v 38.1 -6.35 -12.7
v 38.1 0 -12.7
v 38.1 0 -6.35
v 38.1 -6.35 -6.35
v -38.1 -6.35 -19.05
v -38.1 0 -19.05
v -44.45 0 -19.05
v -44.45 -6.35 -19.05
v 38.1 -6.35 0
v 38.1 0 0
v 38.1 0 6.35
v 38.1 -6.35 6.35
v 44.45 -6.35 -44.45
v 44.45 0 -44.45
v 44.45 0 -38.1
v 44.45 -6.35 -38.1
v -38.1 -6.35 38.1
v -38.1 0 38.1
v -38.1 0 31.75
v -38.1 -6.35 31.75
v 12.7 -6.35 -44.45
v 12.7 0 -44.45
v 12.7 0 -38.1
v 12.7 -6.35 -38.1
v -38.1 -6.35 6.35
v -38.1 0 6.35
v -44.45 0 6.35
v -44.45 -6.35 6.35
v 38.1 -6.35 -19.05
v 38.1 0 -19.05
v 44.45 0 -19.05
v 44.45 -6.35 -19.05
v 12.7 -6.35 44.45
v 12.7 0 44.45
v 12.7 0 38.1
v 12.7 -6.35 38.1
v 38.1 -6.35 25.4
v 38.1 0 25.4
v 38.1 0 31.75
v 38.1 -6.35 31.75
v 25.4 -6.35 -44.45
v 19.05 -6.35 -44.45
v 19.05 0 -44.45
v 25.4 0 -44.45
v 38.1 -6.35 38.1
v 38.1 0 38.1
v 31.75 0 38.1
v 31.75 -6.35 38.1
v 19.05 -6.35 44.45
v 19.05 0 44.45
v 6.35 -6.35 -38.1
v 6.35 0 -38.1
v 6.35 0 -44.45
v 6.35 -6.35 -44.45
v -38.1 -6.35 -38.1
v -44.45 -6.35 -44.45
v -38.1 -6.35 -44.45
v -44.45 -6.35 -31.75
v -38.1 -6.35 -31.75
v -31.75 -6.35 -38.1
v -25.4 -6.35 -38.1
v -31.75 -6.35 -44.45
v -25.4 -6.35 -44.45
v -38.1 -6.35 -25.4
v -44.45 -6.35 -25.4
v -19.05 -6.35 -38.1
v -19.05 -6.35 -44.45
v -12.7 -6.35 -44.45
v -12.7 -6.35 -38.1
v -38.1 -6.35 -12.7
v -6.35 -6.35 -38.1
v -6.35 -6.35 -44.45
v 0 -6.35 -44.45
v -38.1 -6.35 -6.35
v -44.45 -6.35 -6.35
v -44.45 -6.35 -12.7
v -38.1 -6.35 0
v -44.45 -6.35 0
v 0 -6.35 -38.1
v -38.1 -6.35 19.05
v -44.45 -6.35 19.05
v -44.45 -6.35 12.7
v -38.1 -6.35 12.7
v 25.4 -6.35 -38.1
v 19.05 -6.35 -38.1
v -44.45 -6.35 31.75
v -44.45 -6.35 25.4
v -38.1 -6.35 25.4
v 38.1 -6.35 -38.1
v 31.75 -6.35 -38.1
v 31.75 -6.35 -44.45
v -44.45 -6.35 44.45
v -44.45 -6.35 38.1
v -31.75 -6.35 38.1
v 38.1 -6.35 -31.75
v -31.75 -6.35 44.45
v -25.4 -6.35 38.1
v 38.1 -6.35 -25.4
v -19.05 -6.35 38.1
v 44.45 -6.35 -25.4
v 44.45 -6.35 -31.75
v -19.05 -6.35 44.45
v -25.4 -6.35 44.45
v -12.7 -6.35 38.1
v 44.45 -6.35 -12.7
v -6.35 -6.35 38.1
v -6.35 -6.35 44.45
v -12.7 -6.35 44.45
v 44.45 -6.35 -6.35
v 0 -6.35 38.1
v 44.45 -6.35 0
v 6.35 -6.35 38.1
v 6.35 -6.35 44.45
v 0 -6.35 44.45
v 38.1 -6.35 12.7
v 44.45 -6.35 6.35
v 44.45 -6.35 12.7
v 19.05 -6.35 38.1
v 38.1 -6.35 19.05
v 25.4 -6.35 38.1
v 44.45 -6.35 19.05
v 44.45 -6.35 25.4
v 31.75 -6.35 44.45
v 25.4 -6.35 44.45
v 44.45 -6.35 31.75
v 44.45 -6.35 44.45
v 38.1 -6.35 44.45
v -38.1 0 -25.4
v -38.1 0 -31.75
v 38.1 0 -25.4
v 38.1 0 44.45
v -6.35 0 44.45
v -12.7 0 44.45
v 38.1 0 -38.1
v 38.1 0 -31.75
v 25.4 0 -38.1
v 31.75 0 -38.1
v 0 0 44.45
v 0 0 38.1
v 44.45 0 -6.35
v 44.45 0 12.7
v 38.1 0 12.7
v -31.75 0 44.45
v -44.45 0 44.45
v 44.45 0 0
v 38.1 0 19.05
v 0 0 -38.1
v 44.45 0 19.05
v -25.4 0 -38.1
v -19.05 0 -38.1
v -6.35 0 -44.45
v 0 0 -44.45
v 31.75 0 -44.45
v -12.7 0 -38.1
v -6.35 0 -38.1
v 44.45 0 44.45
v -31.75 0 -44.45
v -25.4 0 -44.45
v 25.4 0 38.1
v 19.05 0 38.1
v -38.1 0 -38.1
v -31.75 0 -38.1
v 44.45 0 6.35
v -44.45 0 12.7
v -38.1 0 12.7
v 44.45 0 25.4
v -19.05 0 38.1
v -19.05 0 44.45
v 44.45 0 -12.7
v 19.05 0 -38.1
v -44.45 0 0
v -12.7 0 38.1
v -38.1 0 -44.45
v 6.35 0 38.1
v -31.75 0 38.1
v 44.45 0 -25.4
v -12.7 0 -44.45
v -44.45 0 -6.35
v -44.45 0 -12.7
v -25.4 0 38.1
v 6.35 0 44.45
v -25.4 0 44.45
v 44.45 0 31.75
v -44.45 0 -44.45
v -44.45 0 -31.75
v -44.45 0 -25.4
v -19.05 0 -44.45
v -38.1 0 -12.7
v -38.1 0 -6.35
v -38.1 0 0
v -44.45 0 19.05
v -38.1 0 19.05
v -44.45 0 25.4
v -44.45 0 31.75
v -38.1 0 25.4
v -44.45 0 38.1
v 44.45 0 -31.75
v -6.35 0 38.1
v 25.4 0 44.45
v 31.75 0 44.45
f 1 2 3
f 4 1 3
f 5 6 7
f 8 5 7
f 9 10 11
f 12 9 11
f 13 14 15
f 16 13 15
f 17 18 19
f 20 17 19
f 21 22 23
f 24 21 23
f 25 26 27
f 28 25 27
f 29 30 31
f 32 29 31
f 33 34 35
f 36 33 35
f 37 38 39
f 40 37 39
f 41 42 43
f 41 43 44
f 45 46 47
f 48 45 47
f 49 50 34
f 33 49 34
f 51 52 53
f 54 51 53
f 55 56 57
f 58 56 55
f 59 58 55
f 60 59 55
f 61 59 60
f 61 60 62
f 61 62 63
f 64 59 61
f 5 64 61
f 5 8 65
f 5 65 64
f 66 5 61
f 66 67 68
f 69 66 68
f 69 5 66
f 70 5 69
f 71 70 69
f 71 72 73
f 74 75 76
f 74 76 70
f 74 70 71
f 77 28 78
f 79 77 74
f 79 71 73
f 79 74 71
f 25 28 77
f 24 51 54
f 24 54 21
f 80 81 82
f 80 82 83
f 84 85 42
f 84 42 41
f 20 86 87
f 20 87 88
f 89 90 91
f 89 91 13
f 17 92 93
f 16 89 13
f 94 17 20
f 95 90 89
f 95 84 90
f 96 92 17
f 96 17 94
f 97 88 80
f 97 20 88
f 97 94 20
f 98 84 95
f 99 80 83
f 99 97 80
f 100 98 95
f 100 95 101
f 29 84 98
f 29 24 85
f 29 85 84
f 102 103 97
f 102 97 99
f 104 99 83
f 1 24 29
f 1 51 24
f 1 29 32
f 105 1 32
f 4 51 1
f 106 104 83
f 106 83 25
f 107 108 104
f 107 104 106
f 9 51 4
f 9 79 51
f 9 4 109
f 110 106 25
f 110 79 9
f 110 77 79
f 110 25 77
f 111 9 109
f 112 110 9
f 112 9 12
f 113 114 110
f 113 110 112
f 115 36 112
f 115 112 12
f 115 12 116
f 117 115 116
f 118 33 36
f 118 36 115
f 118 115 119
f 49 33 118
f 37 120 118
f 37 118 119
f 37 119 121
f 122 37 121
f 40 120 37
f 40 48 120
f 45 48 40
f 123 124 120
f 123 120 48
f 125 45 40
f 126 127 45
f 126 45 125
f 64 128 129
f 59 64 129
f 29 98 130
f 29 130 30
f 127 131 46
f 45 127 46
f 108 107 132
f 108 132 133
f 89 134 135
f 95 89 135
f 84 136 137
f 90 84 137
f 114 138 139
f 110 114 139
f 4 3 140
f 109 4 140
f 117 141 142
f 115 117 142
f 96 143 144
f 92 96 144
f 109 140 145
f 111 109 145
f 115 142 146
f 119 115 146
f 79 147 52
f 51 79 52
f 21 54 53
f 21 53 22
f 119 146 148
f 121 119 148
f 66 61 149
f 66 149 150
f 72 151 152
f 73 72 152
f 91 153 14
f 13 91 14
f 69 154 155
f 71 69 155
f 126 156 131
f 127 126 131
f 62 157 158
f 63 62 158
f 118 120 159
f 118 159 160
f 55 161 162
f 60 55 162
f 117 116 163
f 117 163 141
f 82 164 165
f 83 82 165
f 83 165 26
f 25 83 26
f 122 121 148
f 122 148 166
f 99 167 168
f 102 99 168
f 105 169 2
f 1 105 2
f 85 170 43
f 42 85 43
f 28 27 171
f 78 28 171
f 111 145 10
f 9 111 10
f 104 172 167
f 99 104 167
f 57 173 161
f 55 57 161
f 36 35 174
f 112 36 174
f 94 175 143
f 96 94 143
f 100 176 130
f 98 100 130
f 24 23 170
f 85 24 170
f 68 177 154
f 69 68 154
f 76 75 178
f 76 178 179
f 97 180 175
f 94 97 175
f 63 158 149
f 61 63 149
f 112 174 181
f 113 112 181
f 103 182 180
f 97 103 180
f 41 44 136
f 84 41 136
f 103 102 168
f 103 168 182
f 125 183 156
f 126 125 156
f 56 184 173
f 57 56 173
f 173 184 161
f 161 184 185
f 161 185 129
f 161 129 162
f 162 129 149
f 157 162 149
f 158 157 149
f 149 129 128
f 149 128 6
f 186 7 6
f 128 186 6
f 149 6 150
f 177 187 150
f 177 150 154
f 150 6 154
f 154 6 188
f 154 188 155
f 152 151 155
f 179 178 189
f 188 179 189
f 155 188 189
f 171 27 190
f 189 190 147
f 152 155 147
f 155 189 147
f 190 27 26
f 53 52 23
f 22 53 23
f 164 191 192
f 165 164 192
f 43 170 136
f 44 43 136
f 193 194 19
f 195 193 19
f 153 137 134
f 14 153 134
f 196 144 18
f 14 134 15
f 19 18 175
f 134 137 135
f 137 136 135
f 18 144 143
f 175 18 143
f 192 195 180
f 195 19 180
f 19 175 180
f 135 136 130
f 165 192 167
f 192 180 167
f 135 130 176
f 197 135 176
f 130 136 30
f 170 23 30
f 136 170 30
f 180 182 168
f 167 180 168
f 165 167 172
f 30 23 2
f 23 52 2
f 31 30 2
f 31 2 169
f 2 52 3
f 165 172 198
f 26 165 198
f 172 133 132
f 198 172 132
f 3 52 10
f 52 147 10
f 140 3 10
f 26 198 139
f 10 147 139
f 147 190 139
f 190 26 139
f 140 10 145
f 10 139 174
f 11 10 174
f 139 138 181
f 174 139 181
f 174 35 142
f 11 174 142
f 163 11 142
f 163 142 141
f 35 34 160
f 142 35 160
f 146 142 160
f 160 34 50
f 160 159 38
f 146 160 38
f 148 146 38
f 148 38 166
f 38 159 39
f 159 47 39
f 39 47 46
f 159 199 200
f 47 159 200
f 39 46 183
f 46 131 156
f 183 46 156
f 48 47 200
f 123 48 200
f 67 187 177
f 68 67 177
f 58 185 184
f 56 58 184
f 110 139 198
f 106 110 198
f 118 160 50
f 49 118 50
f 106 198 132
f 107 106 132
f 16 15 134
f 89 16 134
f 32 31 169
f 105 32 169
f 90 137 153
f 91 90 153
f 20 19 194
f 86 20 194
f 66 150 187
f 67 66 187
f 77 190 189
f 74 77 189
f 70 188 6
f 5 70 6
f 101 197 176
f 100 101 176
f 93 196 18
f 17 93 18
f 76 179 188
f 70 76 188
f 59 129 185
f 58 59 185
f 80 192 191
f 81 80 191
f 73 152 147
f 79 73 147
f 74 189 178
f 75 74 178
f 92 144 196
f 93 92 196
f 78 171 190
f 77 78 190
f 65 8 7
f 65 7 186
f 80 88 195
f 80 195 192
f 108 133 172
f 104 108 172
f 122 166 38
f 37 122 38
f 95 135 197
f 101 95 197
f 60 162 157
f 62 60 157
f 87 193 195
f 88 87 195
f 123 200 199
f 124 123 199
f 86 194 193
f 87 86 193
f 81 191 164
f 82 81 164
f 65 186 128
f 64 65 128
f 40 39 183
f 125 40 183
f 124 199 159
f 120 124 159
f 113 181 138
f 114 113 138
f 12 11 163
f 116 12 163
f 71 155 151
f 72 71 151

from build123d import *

# Parameters (mm, degrees)
F1_DEPTH = 6.35


with BuildPart() as f1:
    # F0 (on Front) → F1 (new body)
    with BuildSketch(Plane.XZ):
        Polygon((38.1, 44.45), (38.1, 38.1), (31.75, 38.1), (31.75, 44.45), (25.4, 44.45), (25.4, 38.1), (19.05, 38.1), (19.05, 44.45), (12.7, 44.45), (12.7, 38.1), (6.35, 38.1), (6.35, 44.45), (0, 44.45), (0, 38.1), (-6.35, 38.1), (-6.35, 44.45), (-12.7, 44.45), (-12.7, 38.1), (-19.05, 38.1), (-19.05, 44.45), (-25.4, 44.45), (-25.4, 38.1), (-31.75, 38.1), (-31.75, 44.45), (-44.45, 44.45), (-44.45, 38.1), (-38.1, 38.1), (-38.1, 31.75), (-44.45, 31.75), (-44.45, 25.4), (-38.1, 25.4), (-38.1, 19.05), (-44.45, 19.05), (-44.45, 12.7), (-38.1, 12.7), (-38.1, 6.35), (-44.45, 6.35), (-44.45, 0), (-38.1, 0), (-38.1, -6.35), (-44.45, -6.35), (-44.45, -12.7), (-38.1, -12.7), (-38.1, -19.05), (-44.45, -19.05), (-44.45, -25.4), (-38.1, -25.4), (-38.1, -31.75), (-44.45, -31.75), (-44.45, -44.45), (-38.1, -44.45), (-38.1, -38.1), (-31.75, -38.1), (-31.75, -44.45), (-25.4, -44.45), (-25.4, -38.1), (-19.05, -38.1), (-19.05, -44.45), (-12.7, -44.45), (-12.7, -38.1), (-6.35, -38.1), (-6.35, -44.45), (0, -44.45), (0, -38.1), (6.35, -38.1), (6.35, -44.45), (12.7, -44.45), (12.7, -38.1), (19.05, -38.1), (19.05, -44.45), (25.4, -44.45), (25.4, -38.1), (31.75, -38.1), (31.75, -44.45), (44.45, -44.45), (44.45, -38.1), (38.1, -38.1), (38.1, -31.75), (44.45, -31.75), (44.45, -25.4), (38.1, -25.4), (38.1, -19.05), (44.45, -19.05), (44.45, -12.7), (38.1, -12.7), (38.1, -6.35), (44.45, -6.35), (44.45, 0), (38.1, 0), (38.1, 6.35), (44.45, 6.35), (44.45, 12.7), (38.1, 12.7), (38.1, 19.05), (44.45, 19.05), (44.45, 25.4), (38.1, 25.4), (38.1, 31.75), (44.45, 31.75), (44.45, 44.45), align=None)
    extrude(amount=F1_DEPTH)


solid = f1.part
